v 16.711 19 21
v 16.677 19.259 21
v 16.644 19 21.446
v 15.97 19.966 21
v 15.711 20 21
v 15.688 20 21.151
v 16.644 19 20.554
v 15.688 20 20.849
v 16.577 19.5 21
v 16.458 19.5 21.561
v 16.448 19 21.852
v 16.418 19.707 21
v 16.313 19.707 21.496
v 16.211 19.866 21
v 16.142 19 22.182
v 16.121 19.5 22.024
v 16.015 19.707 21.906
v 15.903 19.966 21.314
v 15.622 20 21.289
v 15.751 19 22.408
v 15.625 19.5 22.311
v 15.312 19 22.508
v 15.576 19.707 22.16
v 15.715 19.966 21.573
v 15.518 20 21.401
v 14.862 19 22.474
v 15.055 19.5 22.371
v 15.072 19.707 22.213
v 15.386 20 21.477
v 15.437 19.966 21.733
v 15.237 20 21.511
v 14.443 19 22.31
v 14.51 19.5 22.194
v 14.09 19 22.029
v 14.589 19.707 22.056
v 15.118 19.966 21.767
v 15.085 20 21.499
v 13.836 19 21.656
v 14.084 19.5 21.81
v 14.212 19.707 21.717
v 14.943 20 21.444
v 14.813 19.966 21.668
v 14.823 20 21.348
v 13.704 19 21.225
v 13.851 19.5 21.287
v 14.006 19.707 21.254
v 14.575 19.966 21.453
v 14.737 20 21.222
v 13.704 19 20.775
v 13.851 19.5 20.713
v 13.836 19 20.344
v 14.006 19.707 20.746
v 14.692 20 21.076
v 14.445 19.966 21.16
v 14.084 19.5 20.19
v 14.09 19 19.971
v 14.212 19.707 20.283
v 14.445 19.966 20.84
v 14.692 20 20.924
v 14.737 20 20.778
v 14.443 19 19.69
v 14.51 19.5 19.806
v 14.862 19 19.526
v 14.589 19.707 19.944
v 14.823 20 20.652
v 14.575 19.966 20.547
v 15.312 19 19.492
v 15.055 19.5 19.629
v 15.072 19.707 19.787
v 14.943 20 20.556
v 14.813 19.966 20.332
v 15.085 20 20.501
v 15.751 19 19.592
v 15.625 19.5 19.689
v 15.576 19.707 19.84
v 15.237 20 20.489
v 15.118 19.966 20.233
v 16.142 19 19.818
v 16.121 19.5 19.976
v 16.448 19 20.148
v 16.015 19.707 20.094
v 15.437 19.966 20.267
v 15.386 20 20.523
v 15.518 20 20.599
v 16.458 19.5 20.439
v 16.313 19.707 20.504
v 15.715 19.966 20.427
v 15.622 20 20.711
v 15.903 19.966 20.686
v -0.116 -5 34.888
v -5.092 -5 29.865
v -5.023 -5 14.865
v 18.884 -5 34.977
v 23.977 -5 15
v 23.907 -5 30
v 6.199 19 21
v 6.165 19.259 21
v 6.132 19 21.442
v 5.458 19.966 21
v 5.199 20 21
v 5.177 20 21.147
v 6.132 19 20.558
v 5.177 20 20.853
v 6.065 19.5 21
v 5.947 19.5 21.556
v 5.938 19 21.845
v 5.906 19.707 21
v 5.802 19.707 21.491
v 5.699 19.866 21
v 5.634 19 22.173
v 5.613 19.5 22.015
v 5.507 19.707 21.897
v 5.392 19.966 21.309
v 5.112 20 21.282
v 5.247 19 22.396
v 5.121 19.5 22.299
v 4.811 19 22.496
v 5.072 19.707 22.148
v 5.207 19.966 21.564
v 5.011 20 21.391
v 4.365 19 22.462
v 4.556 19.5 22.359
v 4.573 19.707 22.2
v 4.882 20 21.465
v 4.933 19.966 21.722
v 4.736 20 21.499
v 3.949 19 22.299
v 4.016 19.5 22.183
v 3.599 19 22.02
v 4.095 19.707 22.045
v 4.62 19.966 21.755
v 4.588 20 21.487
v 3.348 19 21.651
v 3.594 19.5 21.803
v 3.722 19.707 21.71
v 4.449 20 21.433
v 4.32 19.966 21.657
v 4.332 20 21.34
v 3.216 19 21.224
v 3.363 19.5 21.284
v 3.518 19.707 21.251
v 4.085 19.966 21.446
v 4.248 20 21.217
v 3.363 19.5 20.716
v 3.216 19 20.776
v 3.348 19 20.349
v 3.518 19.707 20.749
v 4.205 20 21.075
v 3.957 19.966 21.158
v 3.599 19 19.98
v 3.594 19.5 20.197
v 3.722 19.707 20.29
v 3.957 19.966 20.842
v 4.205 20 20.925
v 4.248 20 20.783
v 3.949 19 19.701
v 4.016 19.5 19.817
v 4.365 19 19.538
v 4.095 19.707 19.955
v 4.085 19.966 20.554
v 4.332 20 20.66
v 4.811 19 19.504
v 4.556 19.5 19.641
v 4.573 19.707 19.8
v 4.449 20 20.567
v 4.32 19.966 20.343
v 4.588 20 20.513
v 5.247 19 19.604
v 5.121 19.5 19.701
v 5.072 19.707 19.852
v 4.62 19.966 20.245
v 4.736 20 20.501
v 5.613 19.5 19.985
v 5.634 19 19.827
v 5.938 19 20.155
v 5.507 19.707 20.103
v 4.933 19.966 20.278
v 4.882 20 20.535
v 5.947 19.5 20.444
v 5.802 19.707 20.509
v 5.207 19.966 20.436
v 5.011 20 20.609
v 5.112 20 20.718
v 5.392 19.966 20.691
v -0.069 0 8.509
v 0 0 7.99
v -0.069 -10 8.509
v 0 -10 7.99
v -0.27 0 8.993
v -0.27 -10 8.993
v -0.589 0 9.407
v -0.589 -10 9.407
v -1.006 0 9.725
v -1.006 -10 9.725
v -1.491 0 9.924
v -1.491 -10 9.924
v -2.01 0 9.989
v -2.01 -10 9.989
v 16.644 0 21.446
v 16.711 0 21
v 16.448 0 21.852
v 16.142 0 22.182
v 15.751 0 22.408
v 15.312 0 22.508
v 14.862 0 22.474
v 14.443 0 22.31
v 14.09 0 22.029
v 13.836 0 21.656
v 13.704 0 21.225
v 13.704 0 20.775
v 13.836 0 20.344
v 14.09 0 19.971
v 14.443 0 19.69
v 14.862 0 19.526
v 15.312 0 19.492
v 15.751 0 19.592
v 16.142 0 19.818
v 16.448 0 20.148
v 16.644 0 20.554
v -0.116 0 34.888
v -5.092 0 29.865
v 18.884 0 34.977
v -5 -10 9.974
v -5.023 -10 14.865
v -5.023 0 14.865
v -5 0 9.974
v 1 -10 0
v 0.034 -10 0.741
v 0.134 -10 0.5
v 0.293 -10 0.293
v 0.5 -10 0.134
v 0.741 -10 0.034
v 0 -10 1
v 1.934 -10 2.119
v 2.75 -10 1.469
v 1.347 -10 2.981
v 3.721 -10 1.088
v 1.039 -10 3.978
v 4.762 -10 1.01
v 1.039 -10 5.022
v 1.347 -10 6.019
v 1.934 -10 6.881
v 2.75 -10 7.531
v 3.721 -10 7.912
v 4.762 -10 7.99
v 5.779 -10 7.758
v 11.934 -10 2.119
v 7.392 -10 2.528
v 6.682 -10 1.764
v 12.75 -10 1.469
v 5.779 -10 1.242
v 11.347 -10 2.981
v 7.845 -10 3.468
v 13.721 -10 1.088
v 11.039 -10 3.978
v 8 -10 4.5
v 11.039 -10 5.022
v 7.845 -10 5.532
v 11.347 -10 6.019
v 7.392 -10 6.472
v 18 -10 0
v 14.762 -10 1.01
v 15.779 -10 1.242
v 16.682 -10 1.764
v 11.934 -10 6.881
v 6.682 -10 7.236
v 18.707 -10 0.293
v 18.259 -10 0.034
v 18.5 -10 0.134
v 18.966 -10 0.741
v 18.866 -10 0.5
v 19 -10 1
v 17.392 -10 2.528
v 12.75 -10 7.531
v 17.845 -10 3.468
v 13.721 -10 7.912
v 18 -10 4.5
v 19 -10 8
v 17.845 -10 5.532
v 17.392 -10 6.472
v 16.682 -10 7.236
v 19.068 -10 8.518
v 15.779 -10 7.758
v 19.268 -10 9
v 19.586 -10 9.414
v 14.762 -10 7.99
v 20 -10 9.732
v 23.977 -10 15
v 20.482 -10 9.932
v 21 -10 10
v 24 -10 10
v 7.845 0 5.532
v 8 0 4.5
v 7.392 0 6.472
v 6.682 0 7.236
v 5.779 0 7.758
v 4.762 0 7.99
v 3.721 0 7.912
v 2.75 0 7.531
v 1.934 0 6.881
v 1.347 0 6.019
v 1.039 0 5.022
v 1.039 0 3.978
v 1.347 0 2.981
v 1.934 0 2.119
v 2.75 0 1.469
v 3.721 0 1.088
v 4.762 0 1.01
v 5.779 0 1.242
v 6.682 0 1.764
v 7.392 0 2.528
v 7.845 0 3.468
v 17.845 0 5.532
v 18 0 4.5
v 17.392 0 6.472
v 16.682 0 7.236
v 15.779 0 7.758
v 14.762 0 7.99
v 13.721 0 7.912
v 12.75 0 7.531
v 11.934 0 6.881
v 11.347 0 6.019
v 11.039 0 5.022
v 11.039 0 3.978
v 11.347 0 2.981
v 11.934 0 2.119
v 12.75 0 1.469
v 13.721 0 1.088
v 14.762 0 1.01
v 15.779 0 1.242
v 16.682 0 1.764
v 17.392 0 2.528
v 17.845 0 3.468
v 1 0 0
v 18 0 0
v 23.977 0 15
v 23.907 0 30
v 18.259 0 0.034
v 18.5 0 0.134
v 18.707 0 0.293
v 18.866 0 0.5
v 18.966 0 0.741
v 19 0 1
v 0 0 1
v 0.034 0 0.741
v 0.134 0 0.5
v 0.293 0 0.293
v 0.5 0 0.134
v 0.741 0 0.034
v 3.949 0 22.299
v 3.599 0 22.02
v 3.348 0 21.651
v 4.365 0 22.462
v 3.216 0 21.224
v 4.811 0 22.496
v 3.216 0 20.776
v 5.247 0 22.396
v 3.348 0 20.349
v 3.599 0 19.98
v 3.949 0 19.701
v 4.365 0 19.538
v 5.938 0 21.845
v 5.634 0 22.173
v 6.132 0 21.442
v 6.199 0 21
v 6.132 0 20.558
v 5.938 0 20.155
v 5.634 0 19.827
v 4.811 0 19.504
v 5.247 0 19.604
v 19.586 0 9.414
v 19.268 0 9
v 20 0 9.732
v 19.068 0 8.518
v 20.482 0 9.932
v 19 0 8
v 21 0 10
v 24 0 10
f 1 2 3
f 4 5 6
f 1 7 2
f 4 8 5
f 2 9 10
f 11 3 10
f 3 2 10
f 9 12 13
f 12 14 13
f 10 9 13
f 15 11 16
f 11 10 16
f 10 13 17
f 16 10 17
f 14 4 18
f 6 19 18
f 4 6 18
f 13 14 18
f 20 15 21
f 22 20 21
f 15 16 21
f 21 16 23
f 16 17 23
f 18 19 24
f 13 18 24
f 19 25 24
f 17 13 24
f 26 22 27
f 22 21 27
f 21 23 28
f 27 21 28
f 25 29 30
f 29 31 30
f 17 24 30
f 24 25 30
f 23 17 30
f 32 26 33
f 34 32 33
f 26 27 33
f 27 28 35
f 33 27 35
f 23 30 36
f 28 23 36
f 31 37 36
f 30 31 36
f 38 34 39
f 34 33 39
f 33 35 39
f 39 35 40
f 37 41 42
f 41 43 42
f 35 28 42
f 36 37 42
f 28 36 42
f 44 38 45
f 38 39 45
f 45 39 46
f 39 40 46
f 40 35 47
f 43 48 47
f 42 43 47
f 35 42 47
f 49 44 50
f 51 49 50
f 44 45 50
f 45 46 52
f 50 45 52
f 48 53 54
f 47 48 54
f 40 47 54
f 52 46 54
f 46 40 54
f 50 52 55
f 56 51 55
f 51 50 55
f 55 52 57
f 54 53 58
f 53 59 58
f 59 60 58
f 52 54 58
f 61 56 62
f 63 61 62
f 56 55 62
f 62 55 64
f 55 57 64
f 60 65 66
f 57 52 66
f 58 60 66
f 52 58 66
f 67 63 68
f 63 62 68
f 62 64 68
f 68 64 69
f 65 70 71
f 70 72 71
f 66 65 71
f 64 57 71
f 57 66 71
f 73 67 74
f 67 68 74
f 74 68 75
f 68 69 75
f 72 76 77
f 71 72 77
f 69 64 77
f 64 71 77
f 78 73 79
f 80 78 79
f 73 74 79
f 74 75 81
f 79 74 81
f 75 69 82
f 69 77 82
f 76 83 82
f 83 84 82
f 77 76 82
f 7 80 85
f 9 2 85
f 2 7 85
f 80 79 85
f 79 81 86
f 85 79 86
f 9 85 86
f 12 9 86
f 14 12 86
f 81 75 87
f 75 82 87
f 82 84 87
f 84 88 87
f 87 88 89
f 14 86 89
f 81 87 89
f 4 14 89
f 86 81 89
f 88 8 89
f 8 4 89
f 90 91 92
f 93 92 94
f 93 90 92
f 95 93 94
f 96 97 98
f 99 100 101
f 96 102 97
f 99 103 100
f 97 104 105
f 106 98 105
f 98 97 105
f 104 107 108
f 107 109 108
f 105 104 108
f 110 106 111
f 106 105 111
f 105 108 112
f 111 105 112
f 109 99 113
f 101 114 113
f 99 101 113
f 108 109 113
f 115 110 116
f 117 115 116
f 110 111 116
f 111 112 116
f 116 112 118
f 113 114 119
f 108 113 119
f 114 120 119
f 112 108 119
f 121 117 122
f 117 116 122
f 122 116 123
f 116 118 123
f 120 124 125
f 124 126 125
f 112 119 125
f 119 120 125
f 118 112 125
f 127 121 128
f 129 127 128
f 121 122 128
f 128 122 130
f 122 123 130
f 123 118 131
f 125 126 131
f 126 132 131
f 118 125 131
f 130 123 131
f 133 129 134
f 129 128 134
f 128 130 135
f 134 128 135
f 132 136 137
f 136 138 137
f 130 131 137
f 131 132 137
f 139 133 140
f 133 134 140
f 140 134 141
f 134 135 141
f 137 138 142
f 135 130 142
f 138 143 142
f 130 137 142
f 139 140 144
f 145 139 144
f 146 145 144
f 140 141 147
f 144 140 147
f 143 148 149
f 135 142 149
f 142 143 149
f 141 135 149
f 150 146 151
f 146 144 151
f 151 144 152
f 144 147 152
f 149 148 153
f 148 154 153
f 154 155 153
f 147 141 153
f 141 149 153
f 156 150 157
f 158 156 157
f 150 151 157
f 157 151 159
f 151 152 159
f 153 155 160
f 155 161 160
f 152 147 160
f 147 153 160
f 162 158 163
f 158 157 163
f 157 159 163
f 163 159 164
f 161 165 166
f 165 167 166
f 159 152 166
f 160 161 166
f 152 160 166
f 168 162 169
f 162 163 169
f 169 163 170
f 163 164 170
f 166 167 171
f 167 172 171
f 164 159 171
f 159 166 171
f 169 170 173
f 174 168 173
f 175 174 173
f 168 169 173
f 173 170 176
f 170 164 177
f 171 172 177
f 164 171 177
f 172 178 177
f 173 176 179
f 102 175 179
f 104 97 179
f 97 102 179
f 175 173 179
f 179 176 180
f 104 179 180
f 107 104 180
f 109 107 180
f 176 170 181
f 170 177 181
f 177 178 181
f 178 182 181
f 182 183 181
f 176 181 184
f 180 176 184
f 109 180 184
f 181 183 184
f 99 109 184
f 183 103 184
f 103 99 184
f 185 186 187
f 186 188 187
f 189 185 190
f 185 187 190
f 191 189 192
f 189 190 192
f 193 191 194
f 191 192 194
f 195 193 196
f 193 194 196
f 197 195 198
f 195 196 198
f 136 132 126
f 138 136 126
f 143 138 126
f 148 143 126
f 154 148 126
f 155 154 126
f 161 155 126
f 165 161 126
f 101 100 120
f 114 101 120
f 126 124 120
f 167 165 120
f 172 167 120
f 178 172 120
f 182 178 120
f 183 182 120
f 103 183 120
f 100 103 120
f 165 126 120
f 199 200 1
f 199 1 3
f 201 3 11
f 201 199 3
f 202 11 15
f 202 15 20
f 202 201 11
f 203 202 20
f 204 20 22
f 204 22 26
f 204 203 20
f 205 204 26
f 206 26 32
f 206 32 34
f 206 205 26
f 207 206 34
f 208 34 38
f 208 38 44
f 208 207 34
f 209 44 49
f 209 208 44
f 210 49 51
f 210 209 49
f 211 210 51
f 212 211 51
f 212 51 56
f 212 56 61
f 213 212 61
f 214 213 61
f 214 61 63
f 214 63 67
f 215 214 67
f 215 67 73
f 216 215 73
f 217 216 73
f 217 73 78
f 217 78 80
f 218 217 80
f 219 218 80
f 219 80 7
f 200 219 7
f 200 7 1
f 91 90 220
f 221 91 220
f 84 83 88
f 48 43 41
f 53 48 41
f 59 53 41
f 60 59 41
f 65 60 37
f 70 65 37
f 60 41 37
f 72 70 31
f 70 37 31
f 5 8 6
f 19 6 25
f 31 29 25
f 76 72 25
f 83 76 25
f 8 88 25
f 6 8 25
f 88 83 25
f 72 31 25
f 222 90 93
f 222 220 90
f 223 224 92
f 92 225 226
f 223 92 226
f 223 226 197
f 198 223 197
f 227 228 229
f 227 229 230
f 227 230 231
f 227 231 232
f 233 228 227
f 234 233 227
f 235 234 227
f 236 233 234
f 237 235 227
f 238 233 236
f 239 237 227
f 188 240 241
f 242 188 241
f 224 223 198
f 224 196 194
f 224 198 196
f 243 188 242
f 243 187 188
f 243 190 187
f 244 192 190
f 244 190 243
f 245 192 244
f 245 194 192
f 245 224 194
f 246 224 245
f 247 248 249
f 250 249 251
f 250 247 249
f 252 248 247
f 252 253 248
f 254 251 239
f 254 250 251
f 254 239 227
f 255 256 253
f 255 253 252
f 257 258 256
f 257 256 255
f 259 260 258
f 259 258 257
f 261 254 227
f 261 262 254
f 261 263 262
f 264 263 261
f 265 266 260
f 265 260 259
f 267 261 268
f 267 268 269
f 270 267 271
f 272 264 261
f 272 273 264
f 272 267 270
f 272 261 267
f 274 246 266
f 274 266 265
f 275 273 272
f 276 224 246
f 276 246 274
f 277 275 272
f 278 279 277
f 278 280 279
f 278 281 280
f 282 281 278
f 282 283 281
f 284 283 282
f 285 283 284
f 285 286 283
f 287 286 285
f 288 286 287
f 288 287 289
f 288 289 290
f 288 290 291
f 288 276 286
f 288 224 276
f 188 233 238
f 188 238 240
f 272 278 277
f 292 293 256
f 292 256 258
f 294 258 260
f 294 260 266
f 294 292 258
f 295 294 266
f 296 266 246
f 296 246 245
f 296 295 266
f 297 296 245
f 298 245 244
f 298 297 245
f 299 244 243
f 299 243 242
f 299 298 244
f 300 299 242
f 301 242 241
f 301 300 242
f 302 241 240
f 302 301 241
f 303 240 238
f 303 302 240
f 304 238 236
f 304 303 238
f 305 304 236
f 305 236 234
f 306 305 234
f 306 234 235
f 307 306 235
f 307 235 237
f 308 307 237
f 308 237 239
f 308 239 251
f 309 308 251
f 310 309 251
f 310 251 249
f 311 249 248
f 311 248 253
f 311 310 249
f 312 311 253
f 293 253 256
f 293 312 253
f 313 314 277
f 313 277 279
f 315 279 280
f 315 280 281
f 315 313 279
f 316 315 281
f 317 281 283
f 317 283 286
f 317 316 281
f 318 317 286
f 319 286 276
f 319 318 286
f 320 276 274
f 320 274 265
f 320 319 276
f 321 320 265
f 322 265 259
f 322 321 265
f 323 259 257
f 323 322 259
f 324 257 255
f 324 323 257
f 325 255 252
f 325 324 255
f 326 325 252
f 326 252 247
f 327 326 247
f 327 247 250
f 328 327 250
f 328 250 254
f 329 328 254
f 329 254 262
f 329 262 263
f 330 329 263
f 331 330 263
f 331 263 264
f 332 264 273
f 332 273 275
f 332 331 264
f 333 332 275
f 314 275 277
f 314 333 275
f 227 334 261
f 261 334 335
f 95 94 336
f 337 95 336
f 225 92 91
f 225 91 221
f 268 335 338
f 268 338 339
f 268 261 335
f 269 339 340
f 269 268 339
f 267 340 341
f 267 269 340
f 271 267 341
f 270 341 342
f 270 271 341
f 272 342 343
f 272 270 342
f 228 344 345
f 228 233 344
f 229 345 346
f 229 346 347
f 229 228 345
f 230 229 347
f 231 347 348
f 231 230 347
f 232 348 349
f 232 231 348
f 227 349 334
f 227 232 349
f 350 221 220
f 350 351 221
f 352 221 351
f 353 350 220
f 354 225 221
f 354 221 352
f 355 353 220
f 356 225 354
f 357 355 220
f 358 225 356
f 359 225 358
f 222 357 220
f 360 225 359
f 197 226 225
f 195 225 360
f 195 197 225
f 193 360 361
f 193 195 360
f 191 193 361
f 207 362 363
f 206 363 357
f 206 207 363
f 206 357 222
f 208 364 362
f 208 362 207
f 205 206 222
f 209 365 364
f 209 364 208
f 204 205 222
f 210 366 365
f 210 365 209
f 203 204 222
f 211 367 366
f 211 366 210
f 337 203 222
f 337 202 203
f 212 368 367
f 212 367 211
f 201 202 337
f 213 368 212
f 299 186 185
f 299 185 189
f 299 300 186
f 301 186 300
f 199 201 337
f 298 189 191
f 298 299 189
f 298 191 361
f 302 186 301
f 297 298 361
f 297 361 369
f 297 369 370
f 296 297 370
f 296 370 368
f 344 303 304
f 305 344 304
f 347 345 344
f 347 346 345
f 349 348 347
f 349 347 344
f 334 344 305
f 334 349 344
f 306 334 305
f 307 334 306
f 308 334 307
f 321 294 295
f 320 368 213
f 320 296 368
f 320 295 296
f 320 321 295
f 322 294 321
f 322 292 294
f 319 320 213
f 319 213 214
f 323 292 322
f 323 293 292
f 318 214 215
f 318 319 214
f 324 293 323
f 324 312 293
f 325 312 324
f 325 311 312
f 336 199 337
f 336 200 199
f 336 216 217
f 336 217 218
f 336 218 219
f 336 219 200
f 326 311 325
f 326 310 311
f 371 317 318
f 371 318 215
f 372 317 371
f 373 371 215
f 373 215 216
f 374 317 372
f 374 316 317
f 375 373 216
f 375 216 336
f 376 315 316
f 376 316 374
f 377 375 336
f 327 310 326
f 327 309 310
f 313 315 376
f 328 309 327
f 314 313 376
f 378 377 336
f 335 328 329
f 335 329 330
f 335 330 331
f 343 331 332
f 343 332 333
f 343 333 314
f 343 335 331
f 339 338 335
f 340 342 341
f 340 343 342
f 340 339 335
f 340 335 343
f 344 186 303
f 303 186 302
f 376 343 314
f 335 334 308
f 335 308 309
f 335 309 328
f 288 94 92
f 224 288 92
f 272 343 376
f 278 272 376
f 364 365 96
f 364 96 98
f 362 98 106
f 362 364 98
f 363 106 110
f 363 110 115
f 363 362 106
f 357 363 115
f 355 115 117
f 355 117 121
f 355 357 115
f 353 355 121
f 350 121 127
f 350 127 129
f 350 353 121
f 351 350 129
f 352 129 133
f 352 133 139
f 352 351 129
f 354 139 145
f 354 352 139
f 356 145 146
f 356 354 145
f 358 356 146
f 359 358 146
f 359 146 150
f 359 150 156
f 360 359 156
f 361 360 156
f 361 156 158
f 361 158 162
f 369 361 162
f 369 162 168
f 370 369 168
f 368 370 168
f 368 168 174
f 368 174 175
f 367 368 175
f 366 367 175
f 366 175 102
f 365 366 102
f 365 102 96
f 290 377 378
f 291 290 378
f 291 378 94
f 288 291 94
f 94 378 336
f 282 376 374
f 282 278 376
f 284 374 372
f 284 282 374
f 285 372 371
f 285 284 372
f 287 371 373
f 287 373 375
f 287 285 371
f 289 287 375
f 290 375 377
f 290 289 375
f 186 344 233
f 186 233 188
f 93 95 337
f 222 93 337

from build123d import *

# Parameters (mm, degrees)
F0_W     = 19
F0_H     = 10
F0_R     = 3.5
F1_DEPTH = 10
F2_W     = 28.999740434
F2_H     = 5
F3_DEPTH = 20
F4_R     = 1.5
F4_R_2   = 1.5122777257
F5_DEPTH = 25
F6_SIZE  = 5
F7_R     = 1
F8_R     = 1
F9_R     = 2


with BuildPart() as f1:
    # F0 (on Front) → F1 (new body)
    with BuildSketch(Plane.XZ):
        with Locations((9.5, 5)):
            Rectangle(F0_W, F0_H)
        with Locations((4.5, 4.5)):
            Circle(F0_R, mode=Mode.SUBTRACT)
        with Locations((14.5, 4.5)):
            Circle(F0_R, mode=Mode.SUBTRACT)
        Polygon((-4.999931565, 9.9738400144), (0, 10), (19, 10), (24, 10), (23.9767846348, 14.9999461044), (-5.0226432074, 14.8652981916), align=None)
    extrude(amount=F1_DEPTH)

    # F2 (on face) → F3 (join)
    with BuildSketch(Plane(origin=(-0.0691282, 0, 14.8882979715), x_dir=(0.9999892209, 0, 0.004643073), z_dir=(-0.004643073, 0, 0.9999892209))):
        with Locations((9.5463018144, -2.5)):
            Rectangle(F2_W, F2_H)
    extrude(amount=F3_DEPTH)

    # F4 (on face) → F5 (join)
    with BuildSketch(Plane.XZ.offset(5)):
        with Locations((4.6989777146, 21)):
            Circle(F4_R)
        with Locations((15.1989777146, 21)):
            Circle(F4_R_2)
    extrude(amount=-F5_DEPTH)

    # F6
    f6_edges = [f1.edges().sort_by_distance(p)[0] for p in [
        (-5.115505, -2.5, 34.865083),
        (23.883923, -2.5, 34.999731),
    ]]
    chamfer(f6_edges, length=F6_SIZE)

    # F7
    f7_edges = [f1.edges().sort_by_distance(p)[0] for p in [
        (3.198978, 20, 21),
        (13.6867, 20, 21),
    ]]
    fillet(f7_edges, radius=F7_R)

    # F8
    f8_edges = [f1.edges().sort_by_distance(p)[0] for p in [
        (19, -5, 0),
        (0, -5, 0),
    ]]
    fillet(f8_edges, radius=F8_R)

    # F9
    f9_edges = [f1.edges().sort_by_distance(p)[0] for p in [
        (19, -5, 10),
        (0, -5, 10),
    ]]
    fillet(f9_edges, radius=F9_R)


solid = f1.part
